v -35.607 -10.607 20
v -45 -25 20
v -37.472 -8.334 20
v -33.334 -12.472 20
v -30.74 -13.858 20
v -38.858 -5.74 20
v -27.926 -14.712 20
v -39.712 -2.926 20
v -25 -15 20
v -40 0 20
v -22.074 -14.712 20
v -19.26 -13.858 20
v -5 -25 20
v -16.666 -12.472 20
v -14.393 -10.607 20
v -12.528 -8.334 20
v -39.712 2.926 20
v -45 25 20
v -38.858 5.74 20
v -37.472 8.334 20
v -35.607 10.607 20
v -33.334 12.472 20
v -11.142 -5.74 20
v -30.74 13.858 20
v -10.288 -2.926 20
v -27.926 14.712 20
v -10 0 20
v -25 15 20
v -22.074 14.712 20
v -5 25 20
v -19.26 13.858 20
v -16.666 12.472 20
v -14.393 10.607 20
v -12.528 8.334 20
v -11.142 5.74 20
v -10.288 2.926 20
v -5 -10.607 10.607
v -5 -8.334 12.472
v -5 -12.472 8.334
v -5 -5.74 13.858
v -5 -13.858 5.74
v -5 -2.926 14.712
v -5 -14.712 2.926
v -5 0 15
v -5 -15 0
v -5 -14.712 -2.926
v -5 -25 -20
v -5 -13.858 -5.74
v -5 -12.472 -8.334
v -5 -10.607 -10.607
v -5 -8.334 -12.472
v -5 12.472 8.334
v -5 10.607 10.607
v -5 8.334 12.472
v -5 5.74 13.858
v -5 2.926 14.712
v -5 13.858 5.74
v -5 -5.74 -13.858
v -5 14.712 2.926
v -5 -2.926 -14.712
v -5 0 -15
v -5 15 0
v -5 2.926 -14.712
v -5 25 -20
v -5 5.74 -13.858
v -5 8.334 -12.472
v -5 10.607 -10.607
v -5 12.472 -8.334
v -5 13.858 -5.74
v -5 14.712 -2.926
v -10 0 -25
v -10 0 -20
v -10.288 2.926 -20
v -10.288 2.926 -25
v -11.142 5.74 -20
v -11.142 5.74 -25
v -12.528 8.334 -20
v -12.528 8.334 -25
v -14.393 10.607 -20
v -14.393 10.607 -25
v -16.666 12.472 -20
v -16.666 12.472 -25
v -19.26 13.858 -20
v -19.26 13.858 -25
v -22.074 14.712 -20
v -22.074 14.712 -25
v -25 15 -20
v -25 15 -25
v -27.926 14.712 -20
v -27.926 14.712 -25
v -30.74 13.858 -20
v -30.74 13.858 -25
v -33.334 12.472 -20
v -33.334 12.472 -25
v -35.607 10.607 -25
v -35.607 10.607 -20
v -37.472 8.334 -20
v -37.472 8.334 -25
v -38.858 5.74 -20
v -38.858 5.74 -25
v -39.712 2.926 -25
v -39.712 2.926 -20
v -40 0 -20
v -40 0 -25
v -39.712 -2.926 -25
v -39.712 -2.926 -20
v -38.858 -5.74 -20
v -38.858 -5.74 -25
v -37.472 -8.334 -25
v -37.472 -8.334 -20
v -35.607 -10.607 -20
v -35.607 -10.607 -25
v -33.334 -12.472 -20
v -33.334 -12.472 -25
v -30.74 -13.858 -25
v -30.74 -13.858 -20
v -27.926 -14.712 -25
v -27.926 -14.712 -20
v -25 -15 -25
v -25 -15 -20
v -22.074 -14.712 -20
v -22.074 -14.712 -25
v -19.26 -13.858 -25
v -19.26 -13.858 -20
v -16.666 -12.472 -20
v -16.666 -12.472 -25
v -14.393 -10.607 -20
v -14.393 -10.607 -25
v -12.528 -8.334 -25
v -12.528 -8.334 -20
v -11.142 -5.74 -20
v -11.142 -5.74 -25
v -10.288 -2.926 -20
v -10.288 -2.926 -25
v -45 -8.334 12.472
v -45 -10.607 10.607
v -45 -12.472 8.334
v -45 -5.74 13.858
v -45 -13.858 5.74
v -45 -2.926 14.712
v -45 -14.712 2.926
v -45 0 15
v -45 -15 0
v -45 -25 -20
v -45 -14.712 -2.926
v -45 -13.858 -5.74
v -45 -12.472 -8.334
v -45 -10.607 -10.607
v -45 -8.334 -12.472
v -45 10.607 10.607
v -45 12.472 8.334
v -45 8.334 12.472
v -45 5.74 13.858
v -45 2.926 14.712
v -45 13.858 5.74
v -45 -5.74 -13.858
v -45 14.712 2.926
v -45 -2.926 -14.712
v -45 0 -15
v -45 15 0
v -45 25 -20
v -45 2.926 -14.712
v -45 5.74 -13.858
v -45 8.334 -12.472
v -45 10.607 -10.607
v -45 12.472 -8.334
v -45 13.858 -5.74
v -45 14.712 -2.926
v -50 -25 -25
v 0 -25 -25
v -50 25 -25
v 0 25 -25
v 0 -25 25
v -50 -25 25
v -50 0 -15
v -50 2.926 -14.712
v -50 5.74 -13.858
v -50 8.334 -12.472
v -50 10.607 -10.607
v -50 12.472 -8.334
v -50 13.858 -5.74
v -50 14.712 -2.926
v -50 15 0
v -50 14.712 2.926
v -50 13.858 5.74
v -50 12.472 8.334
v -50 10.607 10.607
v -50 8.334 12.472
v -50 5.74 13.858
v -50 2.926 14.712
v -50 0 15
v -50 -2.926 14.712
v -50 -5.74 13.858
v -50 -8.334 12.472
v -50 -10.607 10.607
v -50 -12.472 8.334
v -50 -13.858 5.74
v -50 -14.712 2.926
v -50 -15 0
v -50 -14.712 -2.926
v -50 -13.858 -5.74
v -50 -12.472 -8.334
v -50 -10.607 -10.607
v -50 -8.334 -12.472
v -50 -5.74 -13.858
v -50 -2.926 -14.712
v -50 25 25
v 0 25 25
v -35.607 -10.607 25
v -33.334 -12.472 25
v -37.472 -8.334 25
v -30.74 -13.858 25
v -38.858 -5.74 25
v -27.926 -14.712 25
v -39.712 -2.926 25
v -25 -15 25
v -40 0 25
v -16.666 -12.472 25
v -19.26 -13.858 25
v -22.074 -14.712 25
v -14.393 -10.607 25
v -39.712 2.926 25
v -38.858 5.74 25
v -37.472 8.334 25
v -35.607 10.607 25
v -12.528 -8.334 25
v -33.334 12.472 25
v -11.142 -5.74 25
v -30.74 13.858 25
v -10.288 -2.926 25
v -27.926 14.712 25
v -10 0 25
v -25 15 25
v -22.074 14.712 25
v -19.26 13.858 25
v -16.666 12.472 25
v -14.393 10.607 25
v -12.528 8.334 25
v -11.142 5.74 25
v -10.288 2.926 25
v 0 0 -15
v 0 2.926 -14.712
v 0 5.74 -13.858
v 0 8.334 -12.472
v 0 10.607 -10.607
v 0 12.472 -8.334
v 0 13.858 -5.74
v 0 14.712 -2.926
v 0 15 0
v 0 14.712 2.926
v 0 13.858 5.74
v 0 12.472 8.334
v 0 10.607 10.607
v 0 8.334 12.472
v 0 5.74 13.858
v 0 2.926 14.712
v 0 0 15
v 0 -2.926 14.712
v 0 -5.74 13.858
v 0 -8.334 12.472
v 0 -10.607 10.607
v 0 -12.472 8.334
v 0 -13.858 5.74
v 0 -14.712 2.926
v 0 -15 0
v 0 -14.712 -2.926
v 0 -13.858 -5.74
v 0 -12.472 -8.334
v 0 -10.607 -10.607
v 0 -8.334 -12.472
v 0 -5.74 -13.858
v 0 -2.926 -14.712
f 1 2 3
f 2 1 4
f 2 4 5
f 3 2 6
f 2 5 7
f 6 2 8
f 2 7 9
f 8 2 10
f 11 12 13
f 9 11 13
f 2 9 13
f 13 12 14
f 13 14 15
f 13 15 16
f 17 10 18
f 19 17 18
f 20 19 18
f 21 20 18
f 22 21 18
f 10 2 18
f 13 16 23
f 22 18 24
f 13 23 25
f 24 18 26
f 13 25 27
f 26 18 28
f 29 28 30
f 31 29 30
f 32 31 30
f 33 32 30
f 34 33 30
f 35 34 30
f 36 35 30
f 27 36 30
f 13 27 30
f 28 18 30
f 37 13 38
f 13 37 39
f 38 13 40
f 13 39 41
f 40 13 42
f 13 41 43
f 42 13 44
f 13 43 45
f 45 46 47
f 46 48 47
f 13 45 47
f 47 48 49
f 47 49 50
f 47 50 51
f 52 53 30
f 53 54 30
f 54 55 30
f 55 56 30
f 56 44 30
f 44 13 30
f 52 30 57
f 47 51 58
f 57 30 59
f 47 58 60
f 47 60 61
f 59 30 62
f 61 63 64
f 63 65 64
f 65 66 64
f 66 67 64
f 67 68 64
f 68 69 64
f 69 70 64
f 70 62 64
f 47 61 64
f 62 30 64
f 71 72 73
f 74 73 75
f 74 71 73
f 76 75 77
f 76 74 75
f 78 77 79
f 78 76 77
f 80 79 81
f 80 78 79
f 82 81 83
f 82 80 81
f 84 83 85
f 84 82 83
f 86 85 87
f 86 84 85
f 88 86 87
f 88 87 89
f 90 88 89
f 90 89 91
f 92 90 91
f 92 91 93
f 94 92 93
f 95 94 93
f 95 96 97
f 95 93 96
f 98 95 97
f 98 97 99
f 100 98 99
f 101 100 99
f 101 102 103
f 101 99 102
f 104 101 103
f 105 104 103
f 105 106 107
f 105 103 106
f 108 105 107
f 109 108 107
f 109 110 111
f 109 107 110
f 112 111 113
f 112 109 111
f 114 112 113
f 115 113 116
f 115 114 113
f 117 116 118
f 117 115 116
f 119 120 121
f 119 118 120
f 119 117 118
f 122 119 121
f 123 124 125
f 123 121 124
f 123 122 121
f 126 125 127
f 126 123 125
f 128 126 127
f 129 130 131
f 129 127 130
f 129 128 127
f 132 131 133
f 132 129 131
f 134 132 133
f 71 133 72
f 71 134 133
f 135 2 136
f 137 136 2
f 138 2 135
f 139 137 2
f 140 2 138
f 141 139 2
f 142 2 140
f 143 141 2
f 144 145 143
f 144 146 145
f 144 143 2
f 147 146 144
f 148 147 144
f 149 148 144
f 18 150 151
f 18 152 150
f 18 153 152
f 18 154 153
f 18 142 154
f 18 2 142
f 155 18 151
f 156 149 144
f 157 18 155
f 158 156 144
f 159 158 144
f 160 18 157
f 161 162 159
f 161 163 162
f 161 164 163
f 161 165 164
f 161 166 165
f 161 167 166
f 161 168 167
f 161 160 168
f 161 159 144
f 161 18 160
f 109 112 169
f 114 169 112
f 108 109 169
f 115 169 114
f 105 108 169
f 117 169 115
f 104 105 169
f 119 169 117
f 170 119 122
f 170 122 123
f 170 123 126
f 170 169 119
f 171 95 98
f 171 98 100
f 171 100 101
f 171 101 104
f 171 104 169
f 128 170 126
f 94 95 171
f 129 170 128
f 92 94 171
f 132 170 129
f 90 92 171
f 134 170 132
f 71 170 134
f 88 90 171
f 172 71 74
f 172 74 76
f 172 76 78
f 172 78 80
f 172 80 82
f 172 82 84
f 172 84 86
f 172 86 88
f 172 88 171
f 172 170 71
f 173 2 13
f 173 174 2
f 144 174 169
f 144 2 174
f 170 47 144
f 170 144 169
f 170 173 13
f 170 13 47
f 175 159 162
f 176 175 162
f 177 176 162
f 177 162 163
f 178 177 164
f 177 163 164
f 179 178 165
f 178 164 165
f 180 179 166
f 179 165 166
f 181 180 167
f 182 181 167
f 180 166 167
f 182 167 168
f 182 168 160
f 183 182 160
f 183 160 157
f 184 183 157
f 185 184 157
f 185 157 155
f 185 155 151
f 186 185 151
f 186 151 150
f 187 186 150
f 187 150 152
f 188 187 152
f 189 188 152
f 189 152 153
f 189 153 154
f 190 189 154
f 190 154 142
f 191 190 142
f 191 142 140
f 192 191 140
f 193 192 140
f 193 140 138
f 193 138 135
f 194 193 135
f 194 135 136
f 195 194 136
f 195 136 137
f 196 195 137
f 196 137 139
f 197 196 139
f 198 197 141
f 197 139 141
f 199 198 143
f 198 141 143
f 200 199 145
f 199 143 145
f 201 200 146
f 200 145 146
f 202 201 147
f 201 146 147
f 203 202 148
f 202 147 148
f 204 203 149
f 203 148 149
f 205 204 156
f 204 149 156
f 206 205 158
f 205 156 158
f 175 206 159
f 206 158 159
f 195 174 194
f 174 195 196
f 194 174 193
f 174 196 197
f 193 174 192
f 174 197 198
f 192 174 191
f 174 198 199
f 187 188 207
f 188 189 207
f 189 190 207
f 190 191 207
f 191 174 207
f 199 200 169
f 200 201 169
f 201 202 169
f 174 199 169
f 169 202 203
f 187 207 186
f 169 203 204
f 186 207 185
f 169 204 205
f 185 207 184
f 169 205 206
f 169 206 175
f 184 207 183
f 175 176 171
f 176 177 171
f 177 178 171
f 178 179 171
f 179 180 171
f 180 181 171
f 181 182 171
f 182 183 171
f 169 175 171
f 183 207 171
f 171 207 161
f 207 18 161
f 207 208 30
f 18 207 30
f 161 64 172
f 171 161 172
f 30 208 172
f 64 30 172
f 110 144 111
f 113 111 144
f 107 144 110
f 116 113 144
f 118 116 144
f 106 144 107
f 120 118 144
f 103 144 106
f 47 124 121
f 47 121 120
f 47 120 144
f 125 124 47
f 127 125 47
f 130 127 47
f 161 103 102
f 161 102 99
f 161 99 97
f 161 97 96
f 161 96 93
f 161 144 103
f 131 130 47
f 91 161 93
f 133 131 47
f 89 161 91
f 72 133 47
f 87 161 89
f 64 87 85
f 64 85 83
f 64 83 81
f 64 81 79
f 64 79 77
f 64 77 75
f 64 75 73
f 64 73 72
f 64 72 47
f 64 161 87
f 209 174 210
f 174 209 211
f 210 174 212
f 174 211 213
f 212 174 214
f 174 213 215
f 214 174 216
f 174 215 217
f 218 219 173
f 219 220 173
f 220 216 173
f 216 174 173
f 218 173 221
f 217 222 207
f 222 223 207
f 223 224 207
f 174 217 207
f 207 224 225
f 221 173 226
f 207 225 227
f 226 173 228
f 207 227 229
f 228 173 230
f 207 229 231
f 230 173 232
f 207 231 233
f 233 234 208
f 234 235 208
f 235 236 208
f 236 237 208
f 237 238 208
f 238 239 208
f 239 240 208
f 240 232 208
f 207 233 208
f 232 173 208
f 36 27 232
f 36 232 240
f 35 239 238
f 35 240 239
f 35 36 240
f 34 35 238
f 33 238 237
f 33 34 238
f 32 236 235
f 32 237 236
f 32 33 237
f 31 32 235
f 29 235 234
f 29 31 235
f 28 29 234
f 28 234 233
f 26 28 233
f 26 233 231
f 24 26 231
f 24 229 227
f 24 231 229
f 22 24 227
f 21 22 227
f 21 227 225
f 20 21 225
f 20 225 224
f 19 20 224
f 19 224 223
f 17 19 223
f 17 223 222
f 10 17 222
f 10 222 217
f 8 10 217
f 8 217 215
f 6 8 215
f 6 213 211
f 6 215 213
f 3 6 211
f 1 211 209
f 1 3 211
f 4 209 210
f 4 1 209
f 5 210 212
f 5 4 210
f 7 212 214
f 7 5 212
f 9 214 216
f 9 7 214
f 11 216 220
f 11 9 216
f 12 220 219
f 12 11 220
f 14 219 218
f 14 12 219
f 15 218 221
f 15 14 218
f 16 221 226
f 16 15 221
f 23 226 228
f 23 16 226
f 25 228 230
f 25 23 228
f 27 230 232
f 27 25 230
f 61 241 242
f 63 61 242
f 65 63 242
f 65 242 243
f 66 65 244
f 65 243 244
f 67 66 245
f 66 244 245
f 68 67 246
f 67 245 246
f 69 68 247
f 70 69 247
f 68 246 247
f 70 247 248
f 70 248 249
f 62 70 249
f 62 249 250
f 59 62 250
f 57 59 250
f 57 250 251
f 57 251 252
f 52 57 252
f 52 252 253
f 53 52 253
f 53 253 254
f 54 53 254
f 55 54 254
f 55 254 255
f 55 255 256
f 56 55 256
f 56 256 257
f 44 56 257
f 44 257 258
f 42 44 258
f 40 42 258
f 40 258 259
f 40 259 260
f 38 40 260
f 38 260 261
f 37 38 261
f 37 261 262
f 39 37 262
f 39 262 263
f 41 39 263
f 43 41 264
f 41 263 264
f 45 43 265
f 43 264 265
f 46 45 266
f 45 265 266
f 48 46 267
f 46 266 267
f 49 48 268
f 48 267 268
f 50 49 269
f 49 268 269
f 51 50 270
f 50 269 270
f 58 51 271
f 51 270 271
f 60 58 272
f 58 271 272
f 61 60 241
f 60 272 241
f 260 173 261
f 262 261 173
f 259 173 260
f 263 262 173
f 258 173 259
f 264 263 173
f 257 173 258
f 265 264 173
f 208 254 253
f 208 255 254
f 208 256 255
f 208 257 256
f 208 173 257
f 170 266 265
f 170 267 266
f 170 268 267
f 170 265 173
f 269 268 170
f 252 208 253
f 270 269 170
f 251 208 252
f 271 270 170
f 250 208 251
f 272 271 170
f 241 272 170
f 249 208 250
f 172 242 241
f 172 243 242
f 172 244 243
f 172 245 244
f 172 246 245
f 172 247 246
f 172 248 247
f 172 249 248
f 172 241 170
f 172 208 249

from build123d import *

# Parameters (mm, degrees)
SKETCH1_W           = 50
SKETCH1_H           = 50
BOSS_EXTRUDE1_DEPTH = 50
SKETCH2_W           = 40
SKETCH2_H           = 40
CUT_EXTRUDE1_DEPTH  = 51
SKETCH4_R           = 15
CUT_EXTRUDE2_DEPTH  = 51


with BuildPart() as part:
    # Sketch1 → Boss-Extrude1 (new body)
    with BuildSketch(Plane(origin=(0, 0, 0), x_dir=(0, 0, -1), z_dir=(1, 0, 0))):
        Rectangle(SKETCH1_W, SKETCH1_H)
    extrude(amount=-BOSS_EXTRUDE1_DEPTH)

    # Sketch2 → Cut-Extrude1 (cut, through all)
    with BuildSketch(Plane(origin=(0, 25, 0), x_dir=(1, 0, 0), z_dir=(0, 1, 0))):
        with Locations((-25, 0)):
            Rectangle(SKETCH2_W, SKETCH2_H)
    extrude(amount=-CUT_EXTRUDE1_DEPTH, mode=Mode.SUBTRACT)

    # Sketch4 → Cut-Extrude2 (cut, through all)
    with BuildSketch(Plane(origin=(0, 0, 0), x_dir=(0, 0, -1), z_dir=(1, 0, 0))):
        Circle(SKETCH4_R)
    cut_extrude2 = extrude(amount=-CUT_EXTRUDE2_DEPTH, mode=Mode.SUBTRACT)

    # Mirror4: Cut-Extrude2 across plane
    add(cut_extrude2.mirror(Plane(origin=(-12.5, 0, -12.5), x_dir=(-0.707106781, 0, 0.707106781), z_dir=(0.707106781, 0, 0.707106781))), mode=Mode.SUBTRACT)


solid = part.part
